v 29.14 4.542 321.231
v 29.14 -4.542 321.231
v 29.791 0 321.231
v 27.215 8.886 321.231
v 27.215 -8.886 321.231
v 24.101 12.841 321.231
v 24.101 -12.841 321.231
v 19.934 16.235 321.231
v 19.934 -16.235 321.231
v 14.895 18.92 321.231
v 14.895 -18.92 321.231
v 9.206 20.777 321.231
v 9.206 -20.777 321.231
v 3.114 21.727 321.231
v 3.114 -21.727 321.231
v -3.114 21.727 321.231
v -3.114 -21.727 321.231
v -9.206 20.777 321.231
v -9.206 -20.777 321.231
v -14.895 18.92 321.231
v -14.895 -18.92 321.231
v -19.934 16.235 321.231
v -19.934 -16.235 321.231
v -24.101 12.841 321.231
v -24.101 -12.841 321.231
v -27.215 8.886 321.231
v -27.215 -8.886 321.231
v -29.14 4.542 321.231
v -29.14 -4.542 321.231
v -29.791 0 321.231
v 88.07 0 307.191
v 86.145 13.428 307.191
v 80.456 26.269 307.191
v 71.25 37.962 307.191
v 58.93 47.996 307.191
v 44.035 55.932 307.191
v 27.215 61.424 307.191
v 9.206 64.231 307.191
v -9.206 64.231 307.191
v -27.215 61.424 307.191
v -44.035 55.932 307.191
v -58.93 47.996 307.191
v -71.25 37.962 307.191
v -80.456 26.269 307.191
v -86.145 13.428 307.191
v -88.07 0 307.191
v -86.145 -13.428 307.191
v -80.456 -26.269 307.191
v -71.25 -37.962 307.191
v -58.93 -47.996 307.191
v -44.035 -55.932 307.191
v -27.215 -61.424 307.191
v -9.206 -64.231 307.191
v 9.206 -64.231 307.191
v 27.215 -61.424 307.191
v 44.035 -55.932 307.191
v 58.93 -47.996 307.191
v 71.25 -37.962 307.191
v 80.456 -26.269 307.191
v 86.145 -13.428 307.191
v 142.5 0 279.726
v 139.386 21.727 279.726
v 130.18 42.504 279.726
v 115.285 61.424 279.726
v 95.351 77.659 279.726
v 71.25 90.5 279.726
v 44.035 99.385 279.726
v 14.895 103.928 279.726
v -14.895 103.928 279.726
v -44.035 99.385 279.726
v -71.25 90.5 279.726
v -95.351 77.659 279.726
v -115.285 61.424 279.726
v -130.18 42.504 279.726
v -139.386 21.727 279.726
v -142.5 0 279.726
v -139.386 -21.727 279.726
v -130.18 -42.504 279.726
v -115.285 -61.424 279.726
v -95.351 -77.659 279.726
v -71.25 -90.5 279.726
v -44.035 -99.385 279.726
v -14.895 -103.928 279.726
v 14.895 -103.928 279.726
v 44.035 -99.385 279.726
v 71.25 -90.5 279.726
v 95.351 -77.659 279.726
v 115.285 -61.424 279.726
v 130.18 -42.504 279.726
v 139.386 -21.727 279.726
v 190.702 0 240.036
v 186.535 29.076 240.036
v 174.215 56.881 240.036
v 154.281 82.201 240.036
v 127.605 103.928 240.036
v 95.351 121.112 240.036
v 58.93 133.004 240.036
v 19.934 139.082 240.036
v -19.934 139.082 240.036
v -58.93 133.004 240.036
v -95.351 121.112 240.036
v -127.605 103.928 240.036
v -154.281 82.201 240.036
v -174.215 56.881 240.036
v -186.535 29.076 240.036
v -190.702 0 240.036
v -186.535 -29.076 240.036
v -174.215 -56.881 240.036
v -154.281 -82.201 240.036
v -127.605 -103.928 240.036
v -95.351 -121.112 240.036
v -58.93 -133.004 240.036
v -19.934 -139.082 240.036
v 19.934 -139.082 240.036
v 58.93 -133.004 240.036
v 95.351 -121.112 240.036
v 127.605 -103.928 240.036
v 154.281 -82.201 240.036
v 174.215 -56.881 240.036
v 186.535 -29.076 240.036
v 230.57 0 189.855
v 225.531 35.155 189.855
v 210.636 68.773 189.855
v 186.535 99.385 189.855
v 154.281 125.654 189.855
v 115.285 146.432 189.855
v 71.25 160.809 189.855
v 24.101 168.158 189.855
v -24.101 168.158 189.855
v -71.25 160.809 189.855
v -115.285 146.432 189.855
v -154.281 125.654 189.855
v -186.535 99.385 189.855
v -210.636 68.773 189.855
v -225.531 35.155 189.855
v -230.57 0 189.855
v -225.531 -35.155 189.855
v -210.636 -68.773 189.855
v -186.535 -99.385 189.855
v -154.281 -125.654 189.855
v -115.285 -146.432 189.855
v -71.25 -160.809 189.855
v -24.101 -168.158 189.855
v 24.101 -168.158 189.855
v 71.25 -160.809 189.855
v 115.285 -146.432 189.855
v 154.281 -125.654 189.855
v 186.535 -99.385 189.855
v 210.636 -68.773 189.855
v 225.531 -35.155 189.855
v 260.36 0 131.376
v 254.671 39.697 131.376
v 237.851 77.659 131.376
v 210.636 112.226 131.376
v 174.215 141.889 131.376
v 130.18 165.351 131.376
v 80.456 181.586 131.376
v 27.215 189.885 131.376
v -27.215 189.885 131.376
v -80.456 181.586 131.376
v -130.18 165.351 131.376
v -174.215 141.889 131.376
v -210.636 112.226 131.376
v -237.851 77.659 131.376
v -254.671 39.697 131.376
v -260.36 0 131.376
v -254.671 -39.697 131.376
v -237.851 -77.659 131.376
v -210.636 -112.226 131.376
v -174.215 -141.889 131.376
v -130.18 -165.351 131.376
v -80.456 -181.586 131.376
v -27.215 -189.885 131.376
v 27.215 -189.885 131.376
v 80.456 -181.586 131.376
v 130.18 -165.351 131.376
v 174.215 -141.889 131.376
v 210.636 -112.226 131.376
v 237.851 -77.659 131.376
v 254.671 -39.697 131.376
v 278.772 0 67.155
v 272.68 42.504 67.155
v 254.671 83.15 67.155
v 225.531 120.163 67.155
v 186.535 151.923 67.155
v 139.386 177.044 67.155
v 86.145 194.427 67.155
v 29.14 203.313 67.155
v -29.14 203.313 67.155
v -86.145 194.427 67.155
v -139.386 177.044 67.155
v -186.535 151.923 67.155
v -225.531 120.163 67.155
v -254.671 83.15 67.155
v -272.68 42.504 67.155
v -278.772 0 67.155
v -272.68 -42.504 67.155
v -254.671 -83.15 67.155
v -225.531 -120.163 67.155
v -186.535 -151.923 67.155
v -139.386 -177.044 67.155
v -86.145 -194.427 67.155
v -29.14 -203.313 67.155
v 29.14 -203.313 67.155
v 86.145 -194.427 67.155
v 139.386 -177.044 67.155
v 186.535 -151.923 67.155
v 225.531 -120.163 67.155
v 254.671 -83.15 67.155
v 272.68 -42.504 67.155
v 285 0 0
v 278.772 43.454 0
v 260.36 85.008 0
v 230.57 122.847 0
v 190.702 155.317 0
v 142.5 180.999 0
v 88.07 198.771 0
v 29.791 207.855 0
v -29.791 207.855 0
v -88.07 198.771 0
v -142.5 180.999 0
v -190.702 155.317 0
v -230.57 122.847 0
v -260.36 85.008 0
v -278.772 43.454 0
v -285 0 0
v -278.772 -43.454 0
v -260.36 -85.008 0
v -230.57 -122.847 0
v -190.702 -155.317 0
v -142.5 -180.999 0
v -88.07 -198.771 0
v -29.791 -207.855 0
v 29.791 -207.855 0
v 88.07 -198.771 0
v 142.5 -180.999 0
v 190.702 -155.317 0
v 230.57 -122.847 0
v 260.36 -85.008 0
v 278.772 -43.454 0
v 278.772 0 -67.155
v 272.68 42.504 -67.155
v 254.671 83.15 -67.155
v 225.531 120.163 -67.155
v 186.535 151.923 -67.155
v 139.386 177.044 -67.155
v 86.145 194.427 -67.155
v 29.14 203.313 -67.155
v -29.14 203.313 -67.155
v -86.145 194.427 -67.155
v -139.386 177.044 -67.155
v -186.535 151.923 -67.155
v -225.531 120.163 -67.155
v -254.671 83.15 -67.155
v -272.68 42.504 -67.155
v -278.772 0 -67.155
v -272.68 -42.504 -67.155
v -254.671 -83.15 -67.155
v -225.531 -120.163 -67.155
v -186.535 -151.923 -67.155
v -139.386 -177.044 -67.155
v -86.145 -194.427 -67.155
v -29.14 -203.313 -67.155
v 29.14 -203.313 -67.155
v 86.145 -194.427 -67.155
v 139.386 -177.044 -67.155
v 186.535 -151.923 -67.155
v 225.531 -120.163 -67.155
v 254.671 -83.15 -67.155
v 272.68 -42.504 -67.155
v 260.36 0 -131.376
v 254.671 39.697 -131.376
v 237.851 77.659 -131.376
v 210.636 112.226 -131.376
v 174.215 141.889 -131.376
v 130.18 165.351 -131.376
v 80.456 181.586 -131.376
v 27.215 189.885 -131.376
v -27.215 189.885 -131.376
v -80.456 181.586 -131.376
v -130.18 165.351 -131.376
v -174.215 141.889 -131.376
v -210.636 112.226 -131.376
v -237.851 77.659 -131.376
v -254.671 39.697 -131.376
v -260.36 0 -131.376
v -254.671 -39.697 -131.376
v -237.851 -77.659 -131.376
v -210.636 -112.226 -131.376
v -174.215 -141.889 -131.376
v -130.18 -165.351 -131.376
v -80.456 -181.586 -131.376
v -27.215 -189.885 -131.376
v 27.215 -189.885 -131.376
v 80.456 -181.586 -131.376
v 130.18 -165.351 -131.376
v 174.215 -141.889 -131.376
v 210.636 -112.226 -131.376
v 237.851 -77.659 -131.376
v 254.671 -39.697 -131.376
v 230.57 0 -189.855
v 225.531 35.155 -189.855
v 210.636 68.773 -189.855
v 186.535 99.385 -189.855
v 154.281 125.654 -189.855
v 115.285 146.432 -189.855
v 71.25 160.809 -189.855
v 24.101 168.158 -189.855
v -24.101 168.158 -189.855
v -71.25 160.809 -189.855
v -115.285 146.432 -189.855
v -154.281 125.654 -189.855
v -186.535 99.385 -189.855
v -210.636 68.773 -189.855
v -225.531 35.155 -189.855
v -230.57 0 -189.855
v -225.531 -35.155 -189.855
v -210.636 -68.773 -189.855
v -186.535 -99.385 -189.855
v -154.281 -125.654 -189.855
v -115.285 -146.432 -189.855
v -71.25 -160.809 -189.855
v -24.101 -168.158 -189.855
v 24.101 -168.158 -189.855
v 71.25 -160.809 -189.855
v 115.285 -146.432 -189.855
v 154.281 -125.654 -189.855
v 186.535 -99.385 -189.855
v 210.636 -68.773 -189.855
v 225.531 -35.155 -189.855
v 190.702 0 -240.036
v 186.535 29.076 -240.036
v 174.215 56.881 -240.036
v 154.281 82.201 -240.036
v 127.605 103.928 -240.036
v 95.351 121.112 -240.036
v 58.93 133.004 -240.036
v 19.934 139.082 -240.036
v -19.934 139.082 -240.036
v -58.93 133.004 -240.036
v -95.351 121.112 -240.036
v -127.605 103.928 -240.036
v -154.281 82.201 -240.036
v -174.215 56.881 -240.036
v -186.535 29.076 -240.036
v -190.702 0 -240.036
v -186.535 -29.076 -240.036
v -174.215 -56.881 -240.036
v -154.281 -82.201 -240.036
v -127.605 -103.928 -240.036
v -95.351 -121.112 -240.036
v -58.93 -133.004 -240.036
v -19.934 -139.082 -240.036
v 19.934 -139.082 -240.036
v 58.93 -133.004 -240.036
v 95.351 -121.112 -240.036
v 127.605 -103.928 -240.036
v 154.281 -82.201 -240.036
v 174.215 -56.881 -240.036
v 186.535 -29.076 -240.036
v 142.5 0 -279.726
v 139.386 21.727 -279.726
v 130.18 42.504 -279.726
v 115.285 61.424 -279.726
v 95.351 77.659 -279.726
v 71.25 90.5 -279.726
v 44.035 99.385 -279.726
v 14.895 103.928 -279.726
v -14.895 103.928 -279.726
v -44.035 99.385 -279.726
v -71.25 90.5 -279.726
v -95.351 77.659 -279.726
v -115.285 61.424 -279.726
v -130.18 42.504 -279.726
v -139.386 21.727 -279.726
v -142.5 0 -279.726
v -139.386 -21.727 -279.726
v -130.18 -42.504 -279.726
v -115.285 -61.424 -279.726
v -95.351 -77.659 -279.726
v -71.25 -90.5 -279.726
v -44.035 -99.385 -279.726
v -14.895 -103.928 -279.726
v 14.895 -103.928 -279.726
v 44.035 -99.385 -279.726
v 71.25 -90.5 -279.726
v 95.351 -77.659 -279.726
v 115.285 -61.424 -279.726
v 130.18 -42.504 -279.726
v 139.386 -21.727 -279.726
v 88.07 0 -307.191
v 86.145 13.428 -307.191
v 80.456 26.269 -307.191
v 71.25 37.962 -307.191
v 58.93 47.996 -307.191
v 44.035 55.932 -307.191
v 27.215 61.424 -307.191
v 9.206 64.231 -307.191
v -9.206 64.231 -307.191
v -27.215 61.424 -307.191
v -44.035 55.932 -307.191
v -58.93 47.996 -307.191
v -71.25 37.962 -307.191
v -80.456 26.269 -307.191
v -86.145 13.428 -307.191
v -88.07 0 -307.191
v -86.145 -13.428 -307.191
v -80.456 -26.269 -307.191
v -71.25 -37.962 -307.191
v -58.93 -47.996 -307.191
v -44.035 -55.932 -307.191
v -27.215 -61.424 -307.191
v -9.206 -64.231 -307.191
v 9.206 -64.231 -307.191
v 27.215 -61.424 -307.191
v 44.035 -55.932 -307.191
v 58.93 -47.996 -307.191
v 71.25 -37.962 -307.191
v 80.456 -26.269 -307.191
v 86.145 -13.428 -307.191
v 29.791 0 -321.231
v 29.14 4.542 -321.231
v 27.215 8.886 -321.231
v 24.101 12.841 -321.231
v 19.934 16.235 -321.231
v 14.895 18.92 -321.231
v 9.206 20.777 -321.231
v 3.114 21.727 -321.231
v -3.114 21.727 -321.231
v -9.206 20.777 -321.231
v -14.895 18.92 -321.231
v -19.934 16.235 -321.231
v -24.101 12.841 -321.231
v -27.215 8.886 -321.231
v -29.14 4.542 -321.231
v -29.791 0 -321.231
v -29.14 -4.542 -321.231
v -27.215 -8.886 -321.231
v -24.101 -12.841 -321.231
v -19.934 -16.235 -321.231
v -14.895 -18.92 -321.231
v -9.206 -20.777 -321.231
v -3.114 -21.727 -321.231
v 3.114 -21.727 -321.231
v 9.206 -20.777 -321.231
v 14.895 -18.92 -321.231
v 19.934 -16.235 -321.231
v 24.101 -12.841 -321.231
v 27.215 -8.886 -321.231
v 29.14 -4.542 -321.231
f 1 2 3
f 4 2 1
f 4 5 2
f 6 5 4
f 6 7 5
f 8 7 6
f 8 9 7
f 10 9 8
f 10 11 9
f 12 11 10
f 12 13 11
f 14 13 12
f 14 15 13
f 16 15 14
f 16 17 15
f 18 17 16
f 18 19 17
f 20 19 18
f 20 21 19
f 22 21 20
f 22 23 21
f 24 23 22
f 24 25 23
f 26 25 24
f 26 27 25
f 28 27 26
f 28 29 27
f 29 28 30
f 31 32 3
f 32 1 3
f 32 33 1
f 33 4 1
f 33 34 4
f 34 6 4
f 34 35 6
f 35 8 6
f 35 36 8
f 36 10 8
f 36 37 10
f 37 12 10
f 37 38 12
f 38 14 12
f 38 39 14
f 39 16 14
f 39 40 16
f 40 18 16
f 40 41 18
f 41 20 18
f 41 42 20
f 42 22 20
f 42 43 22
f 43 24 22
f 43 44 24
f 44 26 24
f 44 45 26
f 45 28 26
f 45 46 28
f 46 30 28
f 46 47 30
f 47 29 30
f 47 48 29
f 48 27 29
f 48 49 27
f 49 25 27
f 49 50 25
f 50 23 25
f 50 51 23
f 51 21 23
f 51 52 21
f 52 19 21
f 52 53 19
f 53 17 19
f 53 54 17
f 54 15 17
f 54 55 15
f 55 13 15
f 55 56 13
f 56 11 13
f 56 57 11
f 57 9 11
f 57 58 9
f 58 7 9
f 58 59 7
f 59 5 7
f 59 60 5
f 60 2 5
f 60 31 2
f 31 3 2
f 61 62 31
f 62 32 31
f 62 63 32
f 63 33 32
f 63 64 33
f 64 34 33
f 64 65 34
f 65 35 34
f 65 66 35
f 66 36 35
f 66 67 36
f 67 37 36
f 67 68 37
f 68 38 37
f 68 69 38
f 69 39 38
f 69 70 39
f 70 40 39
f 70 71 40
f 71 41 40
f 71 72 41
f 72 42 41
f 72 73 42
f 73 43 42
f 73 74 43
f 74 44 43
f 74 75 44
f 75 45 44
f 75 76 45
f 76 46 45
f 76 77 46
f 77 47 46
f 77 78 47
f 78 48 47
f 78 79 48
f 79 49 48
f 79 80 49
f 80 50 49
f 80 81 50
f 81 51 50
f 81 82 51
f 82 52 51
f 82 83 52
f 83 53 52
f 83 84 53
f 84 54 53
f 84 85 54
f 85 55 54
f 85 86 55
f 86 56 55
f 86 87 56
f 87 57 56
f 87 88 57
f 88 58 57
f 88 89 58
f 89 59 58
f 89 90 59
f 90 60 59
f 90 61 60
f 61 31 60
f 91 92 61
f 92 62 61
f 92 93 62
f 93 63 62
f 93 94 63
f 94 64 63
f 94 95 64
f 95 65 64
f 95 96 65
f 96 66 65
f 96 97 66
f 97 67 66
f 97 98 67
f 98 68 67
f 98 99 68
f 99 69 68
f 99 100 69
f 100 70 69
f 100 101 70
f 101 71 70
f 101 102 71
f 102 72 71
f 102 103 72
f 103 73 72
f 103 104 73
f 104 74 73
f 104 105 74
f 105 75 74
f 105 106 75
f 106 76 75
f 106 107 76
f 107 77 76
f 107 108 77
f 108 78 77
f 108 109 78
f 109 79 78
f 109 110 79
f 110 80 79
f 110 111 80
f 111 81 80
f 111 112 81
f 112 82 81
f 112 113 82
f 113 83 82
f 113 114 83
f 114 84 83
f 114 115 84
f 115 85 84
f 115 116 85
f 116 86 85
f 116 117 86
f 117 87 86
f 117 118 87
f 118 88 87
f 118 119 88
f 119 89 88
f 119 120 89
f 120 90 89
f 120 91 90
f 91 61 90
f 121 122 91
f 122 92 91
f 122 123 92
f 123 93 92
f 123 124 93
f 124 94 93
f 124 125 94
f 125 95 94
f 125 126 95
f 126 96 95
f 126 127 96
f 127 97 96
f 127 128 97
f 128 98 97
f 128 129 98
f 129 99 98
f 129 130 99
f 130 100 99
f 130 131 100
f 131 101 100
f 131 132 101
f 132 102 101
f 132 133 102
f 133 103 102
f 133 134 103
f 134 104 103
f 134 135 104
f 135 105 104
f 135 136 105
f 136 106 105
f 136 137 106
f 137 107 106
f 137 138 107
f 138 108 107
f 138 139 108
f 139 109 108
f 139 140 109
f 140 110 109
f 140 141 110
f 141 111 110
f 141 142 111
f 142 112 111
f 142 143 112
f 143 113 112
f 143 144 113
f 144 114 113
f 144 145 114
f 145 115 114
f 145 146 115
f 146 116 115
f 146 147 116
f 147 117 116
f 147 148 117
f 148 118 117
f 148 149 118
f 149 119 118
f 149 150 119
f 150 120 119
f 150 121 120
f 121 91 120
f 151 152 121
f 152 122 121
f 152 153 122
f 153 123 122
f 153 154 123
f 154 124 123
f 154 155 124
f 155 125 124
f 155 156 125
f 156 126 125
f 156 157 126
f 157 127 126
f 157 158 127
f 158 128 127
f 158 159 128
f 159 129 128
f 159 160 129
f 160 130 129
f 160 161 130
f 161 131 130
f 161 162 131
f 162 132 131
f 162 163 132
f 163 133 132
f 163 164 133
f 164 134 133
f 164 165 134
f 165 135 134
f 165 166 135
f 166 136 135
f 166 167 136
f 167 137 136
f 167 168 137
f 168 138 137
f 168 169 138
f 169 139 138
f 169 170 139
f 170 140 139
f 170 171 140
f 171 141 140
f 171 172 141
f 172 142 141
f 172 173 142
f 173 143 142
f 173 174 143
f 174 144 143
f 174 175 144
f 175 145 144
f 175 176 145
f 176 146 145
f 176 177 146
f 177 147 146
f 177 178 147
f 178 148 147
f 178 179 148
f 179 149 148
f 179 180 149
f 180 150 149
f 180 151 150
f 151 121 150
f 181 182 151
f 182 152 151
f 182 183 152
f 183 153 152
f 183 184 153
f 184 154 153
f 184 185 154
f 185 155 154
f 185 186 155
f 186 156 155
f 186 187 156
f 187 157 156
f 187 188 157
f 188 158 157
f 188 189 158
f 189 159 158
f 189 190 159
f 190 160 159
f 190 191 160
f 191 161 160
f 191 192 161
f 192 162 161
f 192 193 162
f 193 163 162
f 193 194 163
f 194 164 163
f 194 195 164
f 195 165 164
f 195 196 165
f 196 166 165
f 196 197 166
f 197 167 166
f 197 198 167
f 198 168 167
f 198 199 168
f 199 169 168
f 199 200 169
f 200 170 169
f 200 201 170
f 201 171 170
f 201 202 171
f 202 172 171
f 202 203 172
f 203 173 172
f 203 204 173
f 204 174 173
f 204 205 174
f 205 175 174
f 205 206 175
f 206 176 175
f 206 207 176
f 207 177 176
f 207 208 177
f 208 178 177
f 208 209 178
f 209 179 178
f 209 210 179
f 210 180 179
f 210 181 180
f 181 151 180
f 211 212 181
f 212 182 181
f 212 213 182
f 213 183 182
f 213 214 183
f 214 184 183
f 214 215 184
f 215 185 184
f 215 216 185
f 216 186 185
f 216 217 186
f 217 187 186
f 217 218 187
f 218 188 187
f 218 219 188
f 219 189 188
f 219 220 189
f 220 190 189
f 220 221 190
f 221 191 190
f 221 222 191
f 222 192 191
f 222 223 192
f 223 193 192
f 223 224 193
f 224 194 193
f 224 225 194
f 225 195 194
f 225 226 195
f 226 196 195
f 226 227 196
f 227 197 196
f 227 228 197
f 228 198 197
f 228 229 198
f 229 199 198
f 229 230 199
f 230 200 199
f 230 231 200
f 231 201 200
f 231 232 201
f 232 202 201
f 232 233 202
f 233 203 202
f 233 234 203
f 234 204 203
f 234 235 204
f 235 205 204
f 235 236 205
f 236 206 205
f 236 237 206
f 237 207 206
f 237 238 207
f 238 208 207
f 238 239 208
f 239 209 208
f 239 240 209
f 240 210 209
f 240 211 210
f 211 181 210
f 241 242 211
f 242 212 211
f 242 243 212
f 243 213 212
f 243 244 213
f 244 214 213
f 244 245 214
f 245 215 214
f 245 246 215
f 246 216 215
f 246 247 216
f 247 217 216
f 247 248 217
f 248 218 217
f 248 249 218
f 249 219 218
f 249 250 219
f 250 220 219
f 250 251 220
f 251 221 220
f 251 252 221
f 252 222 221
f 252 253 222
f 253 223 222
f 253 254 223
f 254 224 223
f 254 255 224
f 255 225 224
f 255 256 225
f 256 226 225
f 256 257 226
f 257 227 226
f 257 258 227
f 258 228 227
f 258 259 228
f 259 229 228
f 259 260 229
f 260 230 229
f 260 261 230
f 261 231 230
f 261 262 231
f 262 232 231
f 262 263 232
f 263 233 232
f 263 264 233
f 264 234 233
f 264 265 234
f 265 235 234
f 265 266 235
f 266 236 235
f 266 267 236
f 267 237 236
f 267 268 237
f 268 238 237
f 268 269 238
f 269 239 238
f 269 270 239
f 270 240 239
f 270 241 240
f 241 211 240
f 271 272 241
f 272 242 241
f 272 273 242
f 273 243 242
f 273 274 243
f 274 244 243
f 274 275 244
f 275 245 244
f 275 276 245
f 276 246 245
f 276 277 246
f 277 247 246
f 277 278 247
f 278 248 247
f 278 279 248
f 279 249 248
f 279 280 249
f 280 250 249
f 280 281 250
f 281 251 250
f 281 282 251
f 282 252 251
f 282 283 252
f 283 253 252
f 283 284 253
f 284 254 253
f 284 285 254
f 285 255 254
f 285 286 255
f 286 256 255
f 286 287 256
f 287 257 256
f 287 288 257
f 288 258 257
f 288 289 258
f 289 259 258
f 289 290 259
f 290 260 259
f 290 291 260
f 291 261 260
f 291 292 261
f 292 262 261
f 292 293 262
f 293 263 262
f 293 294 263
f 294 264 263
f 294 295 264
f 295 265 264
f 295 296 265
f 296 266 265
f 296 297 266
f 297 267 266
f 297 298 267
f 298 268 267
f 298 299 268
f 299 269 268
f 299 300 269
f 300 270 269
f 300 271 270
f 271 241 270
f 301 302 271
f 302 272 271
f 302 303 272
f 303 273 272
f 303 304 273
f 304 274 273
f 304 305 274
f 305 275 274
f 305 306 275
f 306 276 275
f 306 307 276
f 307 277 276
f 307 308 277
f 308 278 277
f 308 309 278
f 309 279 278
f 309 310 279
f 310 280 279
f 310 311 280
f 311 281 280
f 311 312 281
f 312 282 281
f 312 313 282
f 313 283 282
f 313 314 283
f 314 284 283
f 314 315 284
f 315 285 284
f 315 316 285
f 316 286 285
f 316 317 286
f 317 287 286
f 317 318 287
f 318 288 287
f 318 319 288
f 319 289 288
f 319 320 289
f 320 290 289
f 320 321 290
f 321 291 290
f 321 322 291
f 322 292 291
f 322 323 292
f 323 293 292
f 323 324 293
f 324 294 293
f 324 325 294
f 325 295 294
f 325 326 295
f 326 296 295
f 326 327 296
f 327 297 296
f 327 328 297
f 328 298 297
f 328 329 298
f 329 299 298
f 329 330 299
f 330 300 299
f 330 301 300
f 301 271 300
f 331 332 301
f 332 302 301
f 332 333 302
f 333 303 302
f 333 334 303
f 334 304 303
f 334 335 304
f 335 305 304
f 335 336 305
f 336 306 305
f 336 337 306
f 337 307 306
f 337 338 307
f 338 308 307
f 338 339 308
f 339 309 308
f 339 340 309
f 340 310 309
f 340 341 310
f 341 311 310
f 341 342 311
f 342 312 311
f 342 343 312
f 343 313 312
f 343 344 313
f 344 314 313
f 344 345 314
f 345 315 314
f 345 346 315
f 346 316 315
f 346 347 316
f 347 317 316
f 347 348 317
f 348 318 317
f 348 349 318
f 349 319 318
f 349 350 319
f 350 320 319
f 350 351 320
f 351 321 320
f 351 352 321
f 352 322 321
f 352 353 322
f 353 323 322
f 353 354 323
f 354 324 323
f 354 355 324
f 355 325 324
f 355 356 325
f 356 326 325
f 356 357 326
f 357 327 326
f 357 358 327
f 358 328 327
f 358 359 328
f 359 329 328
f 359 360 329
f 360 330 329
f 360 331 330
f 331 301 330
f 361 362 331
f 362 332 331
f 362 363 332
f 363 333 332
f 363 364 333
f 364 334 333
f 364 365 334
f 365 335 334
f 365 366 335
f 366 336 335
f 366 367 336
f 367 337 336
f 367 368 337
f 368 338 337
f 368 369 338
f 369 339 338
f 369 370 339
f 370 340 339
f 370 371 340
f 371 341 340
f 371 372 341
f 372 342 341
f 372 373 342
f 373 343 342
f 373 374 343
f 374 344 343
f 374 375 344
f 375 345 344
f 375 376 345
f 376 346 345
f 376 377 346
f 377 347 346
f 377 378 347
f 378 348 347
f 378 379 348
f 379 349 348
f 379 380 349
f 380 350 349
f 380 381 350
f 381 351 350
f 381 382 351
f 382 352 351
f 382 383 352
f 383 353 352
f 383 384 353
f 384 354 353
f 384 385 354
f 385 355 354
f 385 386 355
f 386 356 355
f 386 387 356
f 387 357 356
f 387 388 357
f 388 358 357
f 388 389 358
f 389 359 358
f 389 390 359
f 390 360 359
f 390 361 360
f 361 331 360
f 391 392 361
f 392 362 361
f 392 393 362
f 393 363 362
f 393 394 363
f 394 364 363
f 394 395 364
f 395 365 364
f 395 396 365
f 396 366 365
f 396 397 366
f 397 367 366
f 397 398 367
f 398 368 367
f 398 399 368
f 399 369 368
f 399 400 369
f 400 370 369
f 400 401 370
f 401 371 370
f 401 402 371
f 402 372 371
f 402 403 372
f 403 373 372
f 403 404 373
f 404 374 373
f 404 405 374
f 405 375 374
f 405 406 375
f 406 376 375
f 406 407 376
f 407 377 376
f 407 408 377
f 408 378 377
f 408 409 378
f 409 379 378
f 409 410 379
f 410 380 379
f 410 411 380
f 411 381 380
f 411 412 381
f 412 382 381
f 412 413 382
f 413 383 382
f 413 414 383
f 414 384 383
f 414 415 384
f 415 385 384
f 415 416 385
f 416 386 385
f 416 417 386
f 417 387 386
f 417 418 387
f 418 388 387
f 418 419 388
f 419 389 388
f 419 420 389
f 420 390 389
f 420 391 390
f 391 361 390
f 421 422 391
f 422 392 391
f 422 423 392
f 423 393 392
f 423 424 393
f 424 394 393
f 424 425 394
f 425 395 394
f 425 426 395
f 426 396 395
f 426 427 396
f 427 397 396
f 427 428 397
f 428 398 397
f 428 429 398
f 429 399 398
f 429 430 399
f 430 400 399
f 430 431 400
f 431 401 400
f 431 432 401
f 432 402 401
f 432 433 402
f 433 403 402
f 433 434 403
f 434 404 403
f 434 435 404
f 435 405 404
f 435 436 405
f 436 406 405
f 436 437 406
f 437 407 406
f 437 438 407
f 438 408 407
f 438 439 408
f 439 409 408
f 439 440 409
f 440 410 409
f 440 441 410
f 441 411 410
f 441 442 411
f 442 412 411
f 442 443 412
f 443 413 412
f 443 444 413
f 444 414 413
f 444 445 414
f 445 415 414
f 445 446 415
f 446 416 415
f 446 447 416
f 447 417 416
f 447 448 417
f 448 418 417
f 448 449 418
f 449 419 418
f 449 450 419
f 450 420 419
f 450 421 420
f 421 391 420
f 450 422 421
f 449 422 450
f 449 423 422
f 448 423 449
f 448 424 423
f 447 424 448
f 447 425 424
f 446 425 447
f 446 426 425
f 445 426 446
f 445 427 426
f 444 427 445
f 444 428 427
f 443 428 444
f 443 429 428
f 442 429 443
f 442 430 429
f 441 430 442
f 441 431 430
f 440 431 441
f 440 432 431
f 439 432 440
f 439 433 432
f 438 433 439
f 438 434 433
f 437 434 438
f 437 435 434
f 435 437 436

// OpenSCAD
// Generated by SolidPython 1.0.1 on 2020-07-29 00:46:52


scale(v = [15, 11, 17]) {
	sphere(r = 19);
}
/***********************************************
*********      SolidPython code:      **********
************************************************
 
# import packages: SolidPython
from solid import *
from solid.utils import *
from itertools import chain, combinations, permutations


class Resize:

    def __init__(self, scad_file):
        self.scad_file = scad_file
        #self.scad_file = import_scad(scad_file)
        # cone/cylinder param:
        self.r1 = 0
        self.r2 = 0
        self.h = 0
        # rectangular prism param:
        self.w = 0
        self.l = 0
        # ellipse param:
        self.r = 0

    # import OpenScad code (file name corresponds to shape)


    # classify shape + parameters
    def assign(self, param1, param2, param3):
        if self.scad_file == 'cone.scad':
            self.r1 = param1
            self.r2 = param2
            self.h = param3
        elif self.scad_file == 'cylinder.scad':
            self.r1 = param1
            self.r2 = param2
            self.h = param3
        elif self.scad_file == 'rectangularPrism.scad':
            self.h = param1
            self.l = param2
            self.w = param3
        else:
            self.r = param1
            self.h = param2

    # resize parameters
    def iterate(self):
        x = range(3, 20, 2)
        i = 1
        if self.scad_file == 'cone.scad':
            tempList = list(permutations(x, 2))
            for temp in tempList:
                param1 = temp[0]
                param2 = temp[1]
                filepath = 'produced_scad_files/' + 'cone' + str(param1) + '_' + str(param2) + '_' + '.scad'
                scad_render_to_file(cylinder(h=param1, r1=param2, r2=0), filepath)

        elif self.scad_file == 'cylinder.scad':
            tempList = list(permutations(x, 3))
            for temp in tempList:
                param1 = temp[0]
                param2 = temp[1]
                filepath = 'produced_scad_files/' + 'cylinder' + str(param1) + '_' + str(param2) + '_' + '.scad'
                scad_render_to_file(cylinder(h=param1, r1=param2, r2=param2), filepath)

        elif self.scad_file == 'rectangularPrism.scad':
            tempList = list(permutations(x, 3))
            for temp in tempList:
                param1 = temp[0]
                param2 = temp[1]
                param3 = temp[2]
                filepath = 'produced_scad_files/' + 'rectangularPrism' + str(param1) + '_' + str(param2) + '_' + str(
                    param3) + '.scad'
                scad_render_to_file(cube(size=(param1, param2, param3)), filepath)

        elif self.scad_file == 'ellipse.scad':
            tempList = list(permutations(x, 4))
            for temp in tempList:
                param1 = temp[0]
                param2 = temp[1]
                param3 = temp[2]
                param4 = temp[3]
                filepath = 'produced_scad_files/' + 'ellipse' + str(param1) + '_' + str(param2) + '_' + str(param3) + '_' + str(param4) + '.scad'
                scad_render_to_file(scale([param1, param2, param3])(sphere(r=param4)), filepath)

    def render_to_scadfile(self):
        scad_render_to_file(scad, 'example.scad') 
 
************************************************/
